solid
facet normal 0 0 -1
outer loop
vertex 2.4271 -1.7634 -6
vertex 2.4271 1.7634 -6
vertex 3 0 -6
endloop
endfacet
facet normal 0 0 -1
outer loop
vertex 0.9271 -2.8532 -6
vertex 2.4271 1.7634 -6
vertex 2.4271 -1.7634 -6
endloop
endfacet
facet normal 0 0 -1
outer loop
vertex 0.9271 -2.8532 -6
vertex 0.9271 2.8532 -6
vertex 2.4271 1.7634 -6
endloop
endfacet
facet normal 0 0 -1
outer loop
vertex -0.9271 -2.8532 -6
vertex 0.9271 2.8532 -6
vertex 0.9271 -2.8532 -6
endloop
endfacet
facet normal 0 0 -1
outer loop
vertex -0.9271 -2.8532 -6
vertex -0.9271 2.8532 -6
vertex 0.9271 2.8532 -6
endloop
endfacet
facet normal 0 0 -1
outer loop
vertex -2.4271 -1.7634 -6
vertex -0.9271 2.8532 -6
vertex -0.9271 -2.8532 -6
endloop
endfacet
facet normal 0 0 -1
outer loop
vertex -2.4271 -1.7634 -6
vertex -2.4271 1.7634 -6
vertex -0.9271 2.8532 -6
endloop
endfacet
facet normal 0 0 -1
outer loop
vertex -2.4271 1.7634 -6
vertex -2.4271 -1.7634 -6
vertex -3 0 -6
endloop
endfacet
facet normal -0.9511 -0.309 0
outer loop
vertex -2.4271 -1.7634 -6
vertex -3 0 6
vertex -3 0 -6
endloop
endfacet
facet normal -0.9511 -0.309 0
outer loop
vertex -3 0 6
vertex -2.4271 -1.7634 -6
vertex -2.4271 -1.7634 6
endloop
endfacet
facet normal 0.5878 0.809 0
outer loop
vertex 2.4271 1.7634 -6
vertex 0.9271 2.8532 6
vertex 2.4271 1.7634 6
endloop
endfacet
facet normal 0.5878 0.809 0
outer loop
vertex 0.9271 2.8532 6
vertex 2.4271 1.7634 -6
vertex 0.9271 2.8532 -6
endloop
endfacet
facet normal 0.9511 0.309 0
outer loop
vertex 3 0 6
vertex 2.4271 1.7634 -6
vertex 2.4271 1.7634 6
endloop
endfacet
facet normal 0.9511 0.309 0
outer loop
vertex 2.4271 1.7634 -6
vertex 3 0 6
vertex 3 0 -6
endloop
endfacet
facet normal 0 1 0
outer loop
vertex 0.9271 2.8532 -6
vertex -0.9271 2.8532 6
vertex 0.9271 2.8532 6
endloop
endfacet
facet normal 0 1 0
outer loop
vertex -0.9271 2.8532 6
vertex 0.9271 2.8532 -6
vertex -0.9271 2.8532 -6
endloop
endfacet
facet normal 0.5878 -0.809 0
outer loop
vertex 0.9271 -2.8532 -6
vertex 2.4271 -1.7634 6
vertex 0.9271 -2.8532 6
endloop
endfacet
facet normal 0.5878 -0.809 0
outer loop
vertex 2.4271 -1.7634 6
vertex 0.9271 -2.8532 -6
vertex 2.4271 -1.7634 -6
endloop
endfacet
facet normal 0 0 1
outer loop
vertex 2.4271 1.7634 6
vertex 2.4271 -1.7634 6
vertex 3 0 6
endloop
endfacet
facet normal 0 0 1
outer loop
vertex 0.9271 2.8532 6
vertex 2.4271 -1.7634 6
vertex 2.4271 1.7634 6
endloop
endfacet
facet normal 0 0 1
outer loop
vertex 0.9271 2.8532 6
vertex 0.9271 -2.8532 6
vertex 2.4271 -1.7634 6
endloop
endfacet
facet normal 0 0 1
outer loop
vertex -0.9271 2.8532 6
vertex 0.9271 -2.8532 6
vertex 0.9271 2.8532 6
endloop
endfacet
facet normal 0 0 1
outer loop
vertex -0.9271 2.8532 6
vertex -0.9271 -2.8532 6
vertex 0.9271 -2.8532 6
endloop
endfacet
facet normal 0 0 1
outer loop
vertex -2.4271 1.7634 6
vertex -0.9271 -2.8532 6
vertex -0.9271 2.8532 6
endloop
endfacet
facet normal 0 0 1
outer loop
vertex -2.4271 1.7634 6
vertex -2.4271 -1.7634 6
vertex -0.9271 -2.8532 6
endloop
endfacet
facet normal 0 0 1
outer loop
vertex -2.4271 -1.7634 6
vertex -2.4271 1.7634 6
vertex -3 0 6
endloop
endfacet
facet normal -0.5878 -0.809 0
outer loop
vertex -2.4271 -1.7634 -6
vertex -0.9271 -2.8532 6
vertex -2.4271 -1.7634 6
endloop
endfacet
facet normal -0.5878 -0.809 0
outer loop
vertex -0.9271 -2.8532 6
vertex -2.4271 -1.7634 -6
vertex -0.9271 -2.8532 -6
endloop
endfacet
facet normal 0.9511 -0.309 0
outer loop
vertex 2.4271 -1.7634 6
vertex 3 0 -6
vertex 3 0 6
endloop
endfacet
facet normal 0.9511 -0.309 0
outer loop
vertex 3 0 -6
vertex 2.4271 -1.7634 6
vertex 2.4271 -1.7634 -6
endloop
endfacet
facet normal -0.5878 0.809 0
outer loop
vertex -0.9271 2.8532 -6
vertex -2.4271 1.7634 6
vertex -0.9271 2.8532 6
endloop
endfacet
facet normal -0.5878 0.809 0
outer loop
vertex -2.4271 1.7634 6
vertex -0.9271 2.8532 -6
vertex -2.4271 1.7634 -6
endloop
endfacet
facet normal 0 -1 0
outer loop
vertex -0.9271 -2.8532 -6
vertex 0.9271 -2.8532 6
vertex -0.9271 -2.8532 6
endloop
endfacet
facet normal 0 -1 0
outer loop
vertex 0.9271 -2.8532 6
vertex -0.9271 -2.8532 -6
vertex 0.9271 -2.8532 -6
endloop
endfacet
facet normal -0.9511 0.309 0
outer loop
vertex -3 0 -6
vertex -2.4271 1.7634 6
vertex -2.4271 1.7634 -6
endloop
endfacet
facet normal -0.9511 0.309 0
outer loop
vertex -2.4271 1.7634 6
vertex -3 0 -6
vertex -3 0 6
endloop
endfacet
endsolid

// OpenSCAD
// Parameters
length_mm = 12; //[6:24:1]
thread_size_nominal_d_mm = 6; //[3:12:1]
thread_pitch_mm = 1; //[0.5:2:0.1]
show_threads = 1; //[0:1:1]
hex_socket_af_mm = 3; //[2:5:0.5]
hex_socket_depth_mm = 3; //[1.5:6:0.5]
hob_point_mm = 0; //[0:4:0.5]
tip_cone_length_mm = 1.5; //[0.5:4:0.5]
thread_root_reduction_mm = 0.4; //[0.2:1:0.1]
thread_ridge_height_mm = 0.25; //[0.1:0.6:0.05]
thread_ridge_width_mm = 0.6; //[0.3:1.2:0.1]
thread_ridge_count = 10; //[4:30:1]
overlap_mm = 0.8; //[0.5:2:0.1]

// Screw - complete geometry
module screw() {
  color("DimGray") {
    // Grub screw body
    cylinder(r=thread_size_nominal_d_mm/2, h=length_mm, center=true);

    // Hex socket drive
    difference() {
      translate([0, 0, length_mm/2 - (hex_socket_depth_mm + overlap_mm)/2])
        cylinder(r=hex_socket_af_mm/(2*cos(30)), h=hex_socket_depth_mm + overlap_mm, center=true);
    }

    // Threaded shaft with optional threads
    if (show_threads) {
      union() {
        // Threaded shaft root
        translate([0, 0, -hex_socket_depth_mm/2])
          cylinder(r=thread_size_nominal_d_mm/2 - thread_root_reduction_mm, h=length_mm - hex_socket_depth_mm, center=true);

        // Thread ridges
        for (i = [0:thread_ridge_count-1]) {
          translate([0, 0, -length_mm/2 + thread_ridge_width_mm/2 + i*thread_pitch_mm])
            cylinder(r=thread_size_nominal_d_mm/2 - thread_root_reduction_mm + thread_ridge_height_mm, h=thread_ridge_width_mm, center=true);
        }
      }
    } else {
      // Smooth shaft
      translate([0, 0, -hex_socket_depth_mm/2])
        cylinder(r=thread_size_nominal_d_mm/2 - thread_root_reduction_mm, h=length_mm - hex_socket_depth_mm, center=true);
    }

    // Tip cone
    translate([0, 0, -length_mm/2 + tip_cone_length_mm/2])
      cylinder(r1=thread_size_nominal_d_mm/2, r2=0, h=tip_cone_length_mm, center=true);

    // Optional hobbed point
    if (hob_point_mm > 0) {
      translate([0, 0, -length_mm/2 + tip_cone_length_mm - overlap_mm + hob_point_mm/2])
        cylinder(r=thread_size_nominal_d_mm/2 - thread_root_reduction_mm, h=hob_point_mm, center=true);
    }
  }
}

// Assembly
module assembly() {
  screw();
}

assembly();
